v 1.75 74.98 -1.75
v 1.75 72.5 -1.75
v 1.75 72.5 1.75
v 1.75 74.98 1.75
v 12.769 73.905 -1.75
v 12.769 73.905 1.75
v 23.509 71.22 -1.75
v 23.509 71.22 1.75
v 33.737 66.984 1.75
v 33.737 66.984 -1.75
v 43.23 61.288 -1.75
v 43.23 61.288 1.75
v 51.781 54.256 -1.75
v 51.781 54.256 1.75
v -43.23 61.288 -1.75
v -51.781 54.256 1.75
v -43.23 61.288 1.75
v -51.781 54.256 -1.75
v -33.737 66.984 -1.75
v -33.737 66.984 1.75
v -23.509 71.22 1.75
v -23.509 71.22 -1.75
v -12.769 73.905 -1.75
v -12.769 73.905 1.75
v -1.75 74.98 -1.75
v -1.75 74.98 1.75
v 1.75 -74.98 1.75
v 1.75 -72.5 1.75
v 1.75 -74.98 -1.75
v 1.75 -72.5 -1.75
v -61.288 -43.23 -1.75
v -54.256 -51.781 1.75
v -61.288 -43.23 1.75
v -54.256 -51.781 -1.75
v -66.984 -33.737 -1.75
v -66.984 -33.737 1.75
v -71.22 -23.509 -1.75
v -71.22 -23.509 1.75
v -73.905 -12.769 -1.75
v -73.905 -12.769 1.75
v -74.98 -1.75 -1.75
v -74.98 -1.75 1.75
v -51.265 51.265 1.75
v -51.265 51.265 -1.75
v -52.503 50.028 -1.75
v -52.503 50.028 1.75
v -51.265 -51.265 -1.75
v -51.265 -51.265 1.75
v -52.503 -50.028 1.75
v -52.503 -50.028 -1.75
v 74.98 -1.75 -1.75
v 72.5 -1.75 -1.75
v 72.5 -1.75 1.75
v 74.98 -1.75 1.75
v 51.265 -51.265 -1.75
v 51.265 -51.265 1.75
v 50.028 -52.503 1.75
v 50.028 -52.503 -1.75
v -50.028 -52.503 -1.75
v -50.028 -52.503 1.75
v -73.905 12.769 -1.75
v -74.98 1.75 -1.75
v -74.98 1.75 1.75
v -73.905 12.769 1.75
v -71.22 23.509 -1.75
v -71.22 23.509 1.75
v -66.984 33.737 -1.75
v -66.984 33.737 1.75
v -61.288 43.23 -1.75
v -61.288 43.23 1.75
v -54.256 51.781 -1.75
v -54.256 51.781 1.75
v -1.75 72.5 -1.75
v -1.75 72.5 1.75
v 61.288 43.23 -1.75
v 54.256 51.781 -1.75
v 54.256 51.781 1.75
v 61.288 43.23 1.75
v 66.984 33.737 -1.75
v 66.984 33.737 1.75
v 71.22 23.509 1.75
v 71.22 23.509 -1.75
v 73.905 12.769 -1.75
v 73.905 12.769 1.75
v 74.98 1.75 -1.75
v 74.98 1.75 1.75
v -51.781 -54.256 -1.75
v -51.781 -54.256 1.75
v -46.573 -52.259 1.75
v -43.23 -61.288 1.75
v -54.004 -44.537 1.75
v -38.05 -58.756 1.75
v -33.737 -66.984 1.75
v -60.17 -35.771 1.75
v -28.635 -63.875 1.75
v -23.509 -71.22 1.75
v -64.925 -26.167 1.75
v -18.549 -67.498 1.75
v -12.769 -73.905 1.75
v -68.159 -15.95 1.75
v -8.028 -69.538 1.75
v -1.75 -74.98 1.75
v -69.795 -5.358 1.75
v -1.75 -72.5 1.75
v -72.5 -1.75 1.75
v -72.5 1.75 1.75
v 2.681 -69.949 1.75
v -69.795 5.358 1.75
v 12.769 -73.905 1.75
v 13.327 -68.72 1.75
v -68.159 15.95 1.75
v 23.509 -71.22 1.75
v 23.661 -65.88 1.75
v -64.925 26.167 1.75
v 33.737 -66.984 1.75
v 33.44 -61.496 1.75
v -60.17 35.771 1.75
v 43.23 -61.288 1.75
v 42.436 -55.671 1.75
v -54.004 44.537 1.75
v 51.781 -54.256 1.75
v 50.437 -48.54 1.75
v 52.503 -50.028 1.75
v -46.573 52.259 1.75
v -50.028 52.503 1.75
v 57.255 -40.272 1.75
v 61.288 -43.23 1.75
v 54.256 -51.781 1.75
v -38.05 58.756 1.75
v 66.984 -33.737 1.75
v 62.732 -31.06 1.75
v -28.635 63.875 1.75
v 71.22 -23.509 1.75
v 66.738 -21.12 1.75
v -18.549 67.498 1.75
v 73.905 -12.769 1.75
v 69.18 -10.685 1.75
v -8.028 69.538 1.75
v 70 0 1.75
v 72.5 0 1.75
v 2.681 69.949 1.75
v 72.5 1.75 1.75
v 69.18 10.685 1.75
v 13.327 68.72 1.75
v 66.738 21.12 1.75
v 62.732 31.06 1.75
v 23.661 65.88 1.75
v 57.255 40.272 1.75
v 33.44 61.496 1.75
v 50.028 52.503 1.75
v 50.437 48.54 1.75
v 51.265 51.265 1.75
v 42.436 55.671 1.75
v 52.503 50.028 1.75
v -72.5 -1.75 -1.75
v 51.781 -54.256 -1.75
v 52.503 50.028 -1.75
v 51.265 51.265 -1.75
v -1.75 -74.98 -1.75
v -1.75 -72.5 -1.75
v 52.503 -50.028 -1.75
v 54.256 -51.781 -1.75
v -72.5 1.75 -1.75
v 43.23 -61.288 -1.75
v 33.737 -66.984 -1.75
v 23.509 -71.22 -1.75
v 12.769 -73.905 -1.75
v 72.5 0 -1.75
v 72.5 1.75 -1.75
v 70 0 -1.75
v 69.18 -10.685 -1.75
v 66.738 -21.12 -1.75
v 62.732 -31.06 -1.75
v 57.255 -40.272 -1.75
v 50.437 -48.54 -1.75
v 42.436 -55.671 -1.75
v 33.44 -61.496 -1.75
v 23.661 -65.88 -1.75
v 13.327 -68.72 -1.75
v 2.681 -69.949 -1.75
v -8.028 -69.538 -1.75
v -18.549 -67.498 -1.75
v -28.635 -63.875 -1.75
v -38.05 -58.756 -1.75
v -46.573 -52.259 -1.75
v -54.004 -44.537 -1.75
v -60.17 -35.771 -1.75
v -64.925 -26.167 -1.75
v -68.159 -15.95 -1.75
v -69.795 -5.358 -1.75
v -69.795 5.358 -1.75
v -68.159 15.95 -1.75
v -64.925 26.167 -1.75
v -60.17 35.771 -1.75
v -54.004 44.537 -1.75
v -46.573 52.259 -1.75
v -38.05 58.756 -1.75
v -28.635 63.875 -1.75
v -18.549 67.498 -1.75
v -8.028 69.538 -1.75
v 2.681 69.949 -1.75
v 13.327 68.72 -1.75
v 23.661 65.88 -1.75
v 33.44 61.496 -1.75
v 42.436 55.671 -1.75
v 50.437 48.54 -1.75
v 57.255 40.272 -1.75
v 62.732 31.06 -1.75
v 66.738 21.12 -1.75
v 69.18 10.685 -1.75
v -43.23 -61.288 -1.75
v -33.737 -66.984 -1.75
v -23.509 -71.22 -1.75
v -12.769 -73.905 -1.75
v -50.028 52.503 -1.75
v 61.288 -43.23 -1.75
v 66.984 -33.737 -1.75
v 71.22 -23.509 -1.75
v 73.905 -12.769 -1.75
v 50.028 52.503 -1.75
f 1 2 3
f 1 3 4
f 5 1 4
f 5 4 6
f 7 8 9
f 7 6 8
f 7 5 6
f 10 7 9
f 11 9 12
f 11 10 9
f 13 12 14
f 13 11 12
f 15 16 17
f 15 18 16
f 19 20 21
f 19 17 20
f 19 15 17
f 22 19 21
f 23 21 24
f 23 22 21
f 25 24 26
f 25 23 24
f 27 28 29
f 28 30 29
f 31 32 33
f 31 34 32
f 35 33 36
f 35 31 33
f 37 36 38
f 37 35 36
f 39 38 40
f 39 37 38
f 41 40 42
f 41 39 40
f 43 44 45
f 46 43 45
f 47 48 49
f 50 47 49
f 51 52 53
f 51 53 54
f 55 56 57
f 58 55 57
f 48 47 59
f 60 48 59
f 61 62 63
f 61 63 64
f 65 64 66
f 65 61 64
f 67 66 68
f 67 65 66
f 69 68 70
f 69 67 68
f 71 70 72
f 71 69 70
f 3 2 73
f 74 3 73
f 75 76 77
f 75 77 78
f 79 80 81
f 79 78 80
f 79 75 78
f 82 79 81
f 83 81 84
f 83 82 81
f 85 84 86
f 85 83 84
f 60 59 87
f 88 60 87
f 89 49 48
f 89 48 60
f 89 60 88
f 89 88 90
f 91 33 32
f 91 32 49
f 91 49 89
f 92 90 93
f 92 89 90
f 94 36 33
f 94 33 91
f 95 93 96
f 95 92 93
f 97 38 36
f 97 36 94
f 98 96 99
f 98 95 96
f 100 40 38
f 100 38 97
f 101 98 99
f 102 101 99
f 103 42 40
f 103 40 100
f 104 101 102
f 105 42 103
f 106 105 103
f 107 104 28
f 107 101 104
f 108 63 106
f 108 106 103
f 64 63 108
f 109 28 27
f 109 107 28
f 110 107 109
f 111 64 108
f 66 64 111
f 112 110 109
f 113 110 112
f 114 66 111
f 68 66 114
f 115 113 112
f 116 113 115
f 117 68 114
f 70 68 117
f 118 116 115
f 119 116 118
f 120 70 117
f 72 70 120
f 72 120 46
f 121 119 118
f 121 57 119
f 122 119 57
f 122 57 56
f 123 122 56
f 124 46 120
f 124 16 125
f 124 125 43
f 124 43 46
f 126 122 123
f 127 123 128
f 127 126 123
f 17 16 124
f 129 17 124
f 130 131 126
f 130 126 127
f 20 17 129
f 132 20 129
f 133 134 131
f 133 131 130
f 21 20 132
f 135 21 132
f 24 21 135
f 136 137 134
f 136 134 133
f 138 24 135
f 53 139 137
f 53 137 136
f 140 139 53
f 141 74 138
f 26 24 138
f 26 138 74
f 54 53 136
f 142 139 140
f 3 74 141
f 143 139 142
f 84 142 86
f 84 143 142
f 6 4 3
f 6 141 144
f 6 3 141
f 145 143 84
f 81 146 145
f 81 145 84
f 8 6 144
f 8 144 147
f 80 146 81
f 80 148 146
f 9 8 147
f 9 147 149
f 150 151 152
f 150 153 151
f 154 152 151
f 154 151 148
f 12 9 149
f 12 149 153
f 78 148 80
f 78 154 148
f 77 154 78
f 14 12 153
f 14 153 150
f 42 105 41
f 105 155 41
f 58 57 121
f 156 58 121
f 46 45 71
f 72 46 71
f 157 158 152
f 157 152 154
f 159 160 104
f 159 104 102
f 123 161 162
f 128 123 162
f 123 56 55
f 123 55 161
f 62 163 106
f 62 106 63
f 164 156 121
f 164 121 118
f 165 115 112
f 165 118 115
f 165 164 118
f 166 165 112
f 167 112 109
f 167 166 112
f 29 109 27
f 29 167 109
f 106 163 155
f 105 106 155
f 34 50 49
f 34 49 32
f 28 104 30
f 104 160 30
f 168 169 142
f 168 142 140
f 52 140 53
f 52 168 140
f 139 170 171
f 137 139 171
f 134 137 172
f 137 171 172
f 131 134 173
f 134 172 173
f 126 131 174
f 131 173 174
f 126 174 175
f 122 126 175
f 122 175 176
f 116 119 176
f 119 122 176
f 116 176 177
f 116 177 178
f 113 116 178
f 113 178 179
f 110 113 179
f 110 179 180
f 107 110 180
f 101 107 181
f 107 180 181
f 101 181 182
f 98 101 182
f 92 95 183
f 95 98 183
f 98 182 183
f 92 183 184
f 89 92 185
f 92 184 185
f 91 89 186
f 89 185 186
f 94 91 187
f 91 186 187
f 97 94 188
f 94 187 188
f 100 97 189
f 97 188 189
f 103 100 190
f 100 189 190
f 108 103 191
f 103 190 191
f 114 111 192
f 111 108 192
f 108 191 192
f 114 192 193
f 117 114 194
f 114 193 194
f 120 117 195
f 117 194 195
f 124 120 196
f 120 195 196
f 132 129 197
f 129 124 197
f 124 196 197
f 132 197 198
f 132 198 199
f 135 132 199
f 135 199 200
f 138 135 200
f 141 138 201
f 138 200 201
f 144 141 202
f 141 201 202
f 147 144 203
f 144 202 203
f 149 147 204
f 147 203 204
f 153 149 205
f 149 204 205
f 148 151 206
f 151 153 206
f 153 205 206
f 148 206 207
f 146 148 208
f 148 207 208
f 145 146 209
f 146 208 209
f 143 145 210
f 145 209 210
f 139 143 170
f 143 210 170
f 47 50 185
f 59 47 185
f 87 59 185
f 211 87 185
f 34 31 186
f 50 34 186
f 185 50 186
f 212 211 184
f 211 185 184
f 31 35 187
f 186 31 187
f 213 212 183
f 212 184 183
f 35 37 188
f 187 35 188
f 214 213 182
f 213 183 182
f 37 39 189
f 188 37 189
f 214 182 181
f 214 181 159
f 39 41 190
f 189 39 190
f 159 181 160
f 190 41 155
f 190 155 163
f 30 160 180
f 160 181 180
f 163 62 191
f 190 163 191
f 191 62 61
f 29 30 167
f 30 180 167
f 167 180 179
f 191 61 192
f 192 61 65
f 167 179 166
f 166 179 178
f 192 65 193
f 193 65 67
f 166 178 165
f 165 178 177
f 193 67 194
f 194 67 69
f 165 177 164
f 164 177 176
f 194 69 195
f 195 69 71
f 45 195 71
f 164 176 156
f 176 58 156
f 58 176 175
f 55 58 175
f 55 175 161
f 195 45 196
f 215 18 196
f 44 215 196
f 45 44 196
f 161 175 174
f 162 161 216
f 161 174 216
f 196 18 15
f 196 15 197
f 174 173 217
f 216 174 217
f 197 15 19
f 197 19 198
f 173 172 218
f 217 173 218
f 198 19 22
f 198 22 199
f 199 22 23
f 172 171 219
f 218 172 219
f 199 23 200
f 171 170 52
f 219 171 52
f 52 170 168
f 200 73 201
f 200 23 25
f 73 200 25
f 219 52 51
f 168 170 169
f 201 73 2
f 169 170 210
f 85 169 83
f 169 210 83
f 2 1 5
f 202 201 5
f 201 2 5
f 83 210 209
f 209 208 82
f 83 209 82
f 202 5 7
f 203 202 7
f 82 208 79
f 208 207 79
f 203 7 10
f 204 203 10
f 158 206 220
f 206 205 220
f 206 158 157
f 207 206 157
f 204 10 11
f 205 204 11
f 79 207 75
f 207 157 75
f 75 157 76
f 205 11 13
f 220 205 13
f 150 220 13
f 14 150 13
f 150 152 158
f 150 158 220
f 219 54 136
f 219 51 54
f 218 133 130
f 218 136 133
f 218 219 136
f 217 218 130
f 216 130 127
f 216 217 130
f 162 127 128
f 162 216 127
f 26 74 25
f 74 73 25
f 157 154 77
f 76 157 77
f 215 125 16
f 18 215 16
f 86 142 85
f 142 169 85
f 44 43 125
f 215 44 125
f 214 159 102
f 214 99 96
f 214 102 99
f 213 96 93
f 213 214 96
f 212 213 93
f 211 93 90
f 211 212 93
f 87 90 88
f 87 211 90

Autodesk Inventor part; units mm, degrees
ref_plane "YZ Plane" through (0, 0, 0) normal (1, 0, 0) x (0, 1, 0)
ref_plane "XZ Plane" through (0, 0, 0) normal (0, 1, 0) x (-1, 0, 0)
ref_plane "XY Plane" through (0, 0, 0) normal (0, 0, 1) x (1, 0, 0)
sketch "Sketch1" plane through (0, 0, 0) normal (0, 0, 1) x (1, 0, 0)
  circle A0 centre (0, 0) radius 70
  circle A1 centre (0, 0) radius 75
  line L0 (72.5, 1.75) -> (75, 1.75)
  line L1 (75, 1.75) -> (75, 0)
  line L2 (75, 0) -> (72.5, 0)
  line L3 (72.5, 0) -> (72.5, 1.75)
  line L4 (70, 0) -> (75, 0)
  line L5 (72.5, -1.75) -> (75, -1.75)
  line L6 (75, -1.75) -> (75, 0)
  line L7 (72.5, 0) -> (72.5, -1.75)
  line L8 (51.2652, 51.2652) -> (50.0278, 52.5027)
  line L9 (50.0278, 52.5027) -> (51.7956, 54.2704)
  line L10 (52.5027, 50.0278) -> (54.2704, 51.7956)
  line L11 (51.2652, 51.2652) -> (52.5027, 50.0278)
  line L12 (54.2704, 51.7956) -> (53.033, 53.033)
  line L13 (51.7956, 54.2704) -> (53.033, 53.033)
  line L14 (0, 72.5) -> (-1.75, 72.5)
  line L15 (-1.75, 72.5) -> (-1.75, 75)
  line L16 (1.75, 72.5) -> (1.75, 75)
  line L17 (0, 72.5) -> (1.75, 72.5)
  line L18 (1.75, 75) -> (0, 75)
  line L19 (-1.75, 75) -> (0, 75)
  line L20 (-51.2652, 51.2652) -> (-52.5027, 50.0278)
  line L21 (-52.5027, 50.0278) -> (-54.2704, 51.7956)
  line L22 (-50.0278, 52.5027) -> (-51.7956, 54.2704)
  line L23 (-51.2652, 51.2652) -> (-50.0278, 52.5027)
  line L24 (-51.7956, 54.2704) -> (-53.033, 53.033)
  line L25 (-54.2704, 51.7956) -> (-53.033, 53.033)
  line L26 (-72.5, 0) -> (-72.5, -1.75)
  line L27 (-72.5, -1.75) -> (-75, -1.75)
  line L28 (-72.5, 1.75) -> (-75, 1.75)
  line L29 (-72.5, 0) -> (-72.5, 1.75)
  line L30 (-75, 1.75) -> (-75, 0)
  line L31 (-75, -1.75) -> (-75, 0)
  line L32 (-51.2652, -51.2652) -> (-50.0278, -52.5027)
  line L33 (-50.0278, -52.5027) -> (-51.7956, -54.2704)
  line L34 (-52.5027, -50.0278) -> (-54.2704, -51.7956)
  line L35 (-51.2652, -51.2652) -> (-52.5027, -50.0278)
  line L36 (-54.2704, -51.7956) -> (-53.033, -53.033)
  line L37 (-51.7956, -54.2704) -> (-53.033, -53.033)
  line L38 (0, -72.5) -> (1.75, -72.5)
  line L39 (1.75, -72.5) -> (1.75, -75)
  line L40 (-1.75, -72.5) -> (-1.75, -75)
  line L41 (0, -72.5) -> (-1.75, -72.5)
  line L42 (-1.75, -75) -> (0, -75)
  line L43 (1.75, -75) -> (0, -75)
  line L44 (51.2652, -51.2652) -> (52.5027, -50.0278)
  line L45 (52.5027, -50.0278) -> (54.2704, -51.7956)
  line L46 (50.0278, -52.5027) -> (51.7956, -54.2704)
  line L47 (51.2652, -51.2652) -> (50.0278, -52.5027)
  line L48 (51.7956, -54.2704) -> (53.033, -53.033)
  line L49 (54.2704, -51.7956) -> (53.033, -53.033)
  point P0 (74.9796, 1.75)
  point P1 (54.256, 51.7811)
  point P2 (51.7811, 54.256)
  point P3 (1.75, 74.9796)
  point P4 (-1.75, 74.9796)
  point P5 (-51.7811, 54.256)
  point P6 (-54.256, 51.7811)
  point P7 (-74.9796, 1.75)
  point P8 (-74.9796, -1.75)
  point P9 (-54.256, -51.7811)
  point P10 (-51.7811, -54.256)
  point P11 (-1.75, -74.9796)
  point P12 (1.75, -74.9796)
  point P13 (51.7811, -54.256)
  point P14 (54.256, -51.7811)
  point P15 (74.9796, -1.75)
  dimension "d0" = 140
  dimension "d1" = 5
  dimension "d2" = 1.75
  dimension "d5" = 360
extrude "Extrusion1" add sketch "Sketch1" along normal mid plane 3.5 contours L7 L5 A1 L45 L44 L47 L46 L39 L38 L41 L40 L33 L32 L35 L34 L27 L26 L29 L28 L21 L20 L23 L22 L15 L14 L17 L16 L9 L8 L11 L10 L0 L3
properties part number "Sirsi obroc"
